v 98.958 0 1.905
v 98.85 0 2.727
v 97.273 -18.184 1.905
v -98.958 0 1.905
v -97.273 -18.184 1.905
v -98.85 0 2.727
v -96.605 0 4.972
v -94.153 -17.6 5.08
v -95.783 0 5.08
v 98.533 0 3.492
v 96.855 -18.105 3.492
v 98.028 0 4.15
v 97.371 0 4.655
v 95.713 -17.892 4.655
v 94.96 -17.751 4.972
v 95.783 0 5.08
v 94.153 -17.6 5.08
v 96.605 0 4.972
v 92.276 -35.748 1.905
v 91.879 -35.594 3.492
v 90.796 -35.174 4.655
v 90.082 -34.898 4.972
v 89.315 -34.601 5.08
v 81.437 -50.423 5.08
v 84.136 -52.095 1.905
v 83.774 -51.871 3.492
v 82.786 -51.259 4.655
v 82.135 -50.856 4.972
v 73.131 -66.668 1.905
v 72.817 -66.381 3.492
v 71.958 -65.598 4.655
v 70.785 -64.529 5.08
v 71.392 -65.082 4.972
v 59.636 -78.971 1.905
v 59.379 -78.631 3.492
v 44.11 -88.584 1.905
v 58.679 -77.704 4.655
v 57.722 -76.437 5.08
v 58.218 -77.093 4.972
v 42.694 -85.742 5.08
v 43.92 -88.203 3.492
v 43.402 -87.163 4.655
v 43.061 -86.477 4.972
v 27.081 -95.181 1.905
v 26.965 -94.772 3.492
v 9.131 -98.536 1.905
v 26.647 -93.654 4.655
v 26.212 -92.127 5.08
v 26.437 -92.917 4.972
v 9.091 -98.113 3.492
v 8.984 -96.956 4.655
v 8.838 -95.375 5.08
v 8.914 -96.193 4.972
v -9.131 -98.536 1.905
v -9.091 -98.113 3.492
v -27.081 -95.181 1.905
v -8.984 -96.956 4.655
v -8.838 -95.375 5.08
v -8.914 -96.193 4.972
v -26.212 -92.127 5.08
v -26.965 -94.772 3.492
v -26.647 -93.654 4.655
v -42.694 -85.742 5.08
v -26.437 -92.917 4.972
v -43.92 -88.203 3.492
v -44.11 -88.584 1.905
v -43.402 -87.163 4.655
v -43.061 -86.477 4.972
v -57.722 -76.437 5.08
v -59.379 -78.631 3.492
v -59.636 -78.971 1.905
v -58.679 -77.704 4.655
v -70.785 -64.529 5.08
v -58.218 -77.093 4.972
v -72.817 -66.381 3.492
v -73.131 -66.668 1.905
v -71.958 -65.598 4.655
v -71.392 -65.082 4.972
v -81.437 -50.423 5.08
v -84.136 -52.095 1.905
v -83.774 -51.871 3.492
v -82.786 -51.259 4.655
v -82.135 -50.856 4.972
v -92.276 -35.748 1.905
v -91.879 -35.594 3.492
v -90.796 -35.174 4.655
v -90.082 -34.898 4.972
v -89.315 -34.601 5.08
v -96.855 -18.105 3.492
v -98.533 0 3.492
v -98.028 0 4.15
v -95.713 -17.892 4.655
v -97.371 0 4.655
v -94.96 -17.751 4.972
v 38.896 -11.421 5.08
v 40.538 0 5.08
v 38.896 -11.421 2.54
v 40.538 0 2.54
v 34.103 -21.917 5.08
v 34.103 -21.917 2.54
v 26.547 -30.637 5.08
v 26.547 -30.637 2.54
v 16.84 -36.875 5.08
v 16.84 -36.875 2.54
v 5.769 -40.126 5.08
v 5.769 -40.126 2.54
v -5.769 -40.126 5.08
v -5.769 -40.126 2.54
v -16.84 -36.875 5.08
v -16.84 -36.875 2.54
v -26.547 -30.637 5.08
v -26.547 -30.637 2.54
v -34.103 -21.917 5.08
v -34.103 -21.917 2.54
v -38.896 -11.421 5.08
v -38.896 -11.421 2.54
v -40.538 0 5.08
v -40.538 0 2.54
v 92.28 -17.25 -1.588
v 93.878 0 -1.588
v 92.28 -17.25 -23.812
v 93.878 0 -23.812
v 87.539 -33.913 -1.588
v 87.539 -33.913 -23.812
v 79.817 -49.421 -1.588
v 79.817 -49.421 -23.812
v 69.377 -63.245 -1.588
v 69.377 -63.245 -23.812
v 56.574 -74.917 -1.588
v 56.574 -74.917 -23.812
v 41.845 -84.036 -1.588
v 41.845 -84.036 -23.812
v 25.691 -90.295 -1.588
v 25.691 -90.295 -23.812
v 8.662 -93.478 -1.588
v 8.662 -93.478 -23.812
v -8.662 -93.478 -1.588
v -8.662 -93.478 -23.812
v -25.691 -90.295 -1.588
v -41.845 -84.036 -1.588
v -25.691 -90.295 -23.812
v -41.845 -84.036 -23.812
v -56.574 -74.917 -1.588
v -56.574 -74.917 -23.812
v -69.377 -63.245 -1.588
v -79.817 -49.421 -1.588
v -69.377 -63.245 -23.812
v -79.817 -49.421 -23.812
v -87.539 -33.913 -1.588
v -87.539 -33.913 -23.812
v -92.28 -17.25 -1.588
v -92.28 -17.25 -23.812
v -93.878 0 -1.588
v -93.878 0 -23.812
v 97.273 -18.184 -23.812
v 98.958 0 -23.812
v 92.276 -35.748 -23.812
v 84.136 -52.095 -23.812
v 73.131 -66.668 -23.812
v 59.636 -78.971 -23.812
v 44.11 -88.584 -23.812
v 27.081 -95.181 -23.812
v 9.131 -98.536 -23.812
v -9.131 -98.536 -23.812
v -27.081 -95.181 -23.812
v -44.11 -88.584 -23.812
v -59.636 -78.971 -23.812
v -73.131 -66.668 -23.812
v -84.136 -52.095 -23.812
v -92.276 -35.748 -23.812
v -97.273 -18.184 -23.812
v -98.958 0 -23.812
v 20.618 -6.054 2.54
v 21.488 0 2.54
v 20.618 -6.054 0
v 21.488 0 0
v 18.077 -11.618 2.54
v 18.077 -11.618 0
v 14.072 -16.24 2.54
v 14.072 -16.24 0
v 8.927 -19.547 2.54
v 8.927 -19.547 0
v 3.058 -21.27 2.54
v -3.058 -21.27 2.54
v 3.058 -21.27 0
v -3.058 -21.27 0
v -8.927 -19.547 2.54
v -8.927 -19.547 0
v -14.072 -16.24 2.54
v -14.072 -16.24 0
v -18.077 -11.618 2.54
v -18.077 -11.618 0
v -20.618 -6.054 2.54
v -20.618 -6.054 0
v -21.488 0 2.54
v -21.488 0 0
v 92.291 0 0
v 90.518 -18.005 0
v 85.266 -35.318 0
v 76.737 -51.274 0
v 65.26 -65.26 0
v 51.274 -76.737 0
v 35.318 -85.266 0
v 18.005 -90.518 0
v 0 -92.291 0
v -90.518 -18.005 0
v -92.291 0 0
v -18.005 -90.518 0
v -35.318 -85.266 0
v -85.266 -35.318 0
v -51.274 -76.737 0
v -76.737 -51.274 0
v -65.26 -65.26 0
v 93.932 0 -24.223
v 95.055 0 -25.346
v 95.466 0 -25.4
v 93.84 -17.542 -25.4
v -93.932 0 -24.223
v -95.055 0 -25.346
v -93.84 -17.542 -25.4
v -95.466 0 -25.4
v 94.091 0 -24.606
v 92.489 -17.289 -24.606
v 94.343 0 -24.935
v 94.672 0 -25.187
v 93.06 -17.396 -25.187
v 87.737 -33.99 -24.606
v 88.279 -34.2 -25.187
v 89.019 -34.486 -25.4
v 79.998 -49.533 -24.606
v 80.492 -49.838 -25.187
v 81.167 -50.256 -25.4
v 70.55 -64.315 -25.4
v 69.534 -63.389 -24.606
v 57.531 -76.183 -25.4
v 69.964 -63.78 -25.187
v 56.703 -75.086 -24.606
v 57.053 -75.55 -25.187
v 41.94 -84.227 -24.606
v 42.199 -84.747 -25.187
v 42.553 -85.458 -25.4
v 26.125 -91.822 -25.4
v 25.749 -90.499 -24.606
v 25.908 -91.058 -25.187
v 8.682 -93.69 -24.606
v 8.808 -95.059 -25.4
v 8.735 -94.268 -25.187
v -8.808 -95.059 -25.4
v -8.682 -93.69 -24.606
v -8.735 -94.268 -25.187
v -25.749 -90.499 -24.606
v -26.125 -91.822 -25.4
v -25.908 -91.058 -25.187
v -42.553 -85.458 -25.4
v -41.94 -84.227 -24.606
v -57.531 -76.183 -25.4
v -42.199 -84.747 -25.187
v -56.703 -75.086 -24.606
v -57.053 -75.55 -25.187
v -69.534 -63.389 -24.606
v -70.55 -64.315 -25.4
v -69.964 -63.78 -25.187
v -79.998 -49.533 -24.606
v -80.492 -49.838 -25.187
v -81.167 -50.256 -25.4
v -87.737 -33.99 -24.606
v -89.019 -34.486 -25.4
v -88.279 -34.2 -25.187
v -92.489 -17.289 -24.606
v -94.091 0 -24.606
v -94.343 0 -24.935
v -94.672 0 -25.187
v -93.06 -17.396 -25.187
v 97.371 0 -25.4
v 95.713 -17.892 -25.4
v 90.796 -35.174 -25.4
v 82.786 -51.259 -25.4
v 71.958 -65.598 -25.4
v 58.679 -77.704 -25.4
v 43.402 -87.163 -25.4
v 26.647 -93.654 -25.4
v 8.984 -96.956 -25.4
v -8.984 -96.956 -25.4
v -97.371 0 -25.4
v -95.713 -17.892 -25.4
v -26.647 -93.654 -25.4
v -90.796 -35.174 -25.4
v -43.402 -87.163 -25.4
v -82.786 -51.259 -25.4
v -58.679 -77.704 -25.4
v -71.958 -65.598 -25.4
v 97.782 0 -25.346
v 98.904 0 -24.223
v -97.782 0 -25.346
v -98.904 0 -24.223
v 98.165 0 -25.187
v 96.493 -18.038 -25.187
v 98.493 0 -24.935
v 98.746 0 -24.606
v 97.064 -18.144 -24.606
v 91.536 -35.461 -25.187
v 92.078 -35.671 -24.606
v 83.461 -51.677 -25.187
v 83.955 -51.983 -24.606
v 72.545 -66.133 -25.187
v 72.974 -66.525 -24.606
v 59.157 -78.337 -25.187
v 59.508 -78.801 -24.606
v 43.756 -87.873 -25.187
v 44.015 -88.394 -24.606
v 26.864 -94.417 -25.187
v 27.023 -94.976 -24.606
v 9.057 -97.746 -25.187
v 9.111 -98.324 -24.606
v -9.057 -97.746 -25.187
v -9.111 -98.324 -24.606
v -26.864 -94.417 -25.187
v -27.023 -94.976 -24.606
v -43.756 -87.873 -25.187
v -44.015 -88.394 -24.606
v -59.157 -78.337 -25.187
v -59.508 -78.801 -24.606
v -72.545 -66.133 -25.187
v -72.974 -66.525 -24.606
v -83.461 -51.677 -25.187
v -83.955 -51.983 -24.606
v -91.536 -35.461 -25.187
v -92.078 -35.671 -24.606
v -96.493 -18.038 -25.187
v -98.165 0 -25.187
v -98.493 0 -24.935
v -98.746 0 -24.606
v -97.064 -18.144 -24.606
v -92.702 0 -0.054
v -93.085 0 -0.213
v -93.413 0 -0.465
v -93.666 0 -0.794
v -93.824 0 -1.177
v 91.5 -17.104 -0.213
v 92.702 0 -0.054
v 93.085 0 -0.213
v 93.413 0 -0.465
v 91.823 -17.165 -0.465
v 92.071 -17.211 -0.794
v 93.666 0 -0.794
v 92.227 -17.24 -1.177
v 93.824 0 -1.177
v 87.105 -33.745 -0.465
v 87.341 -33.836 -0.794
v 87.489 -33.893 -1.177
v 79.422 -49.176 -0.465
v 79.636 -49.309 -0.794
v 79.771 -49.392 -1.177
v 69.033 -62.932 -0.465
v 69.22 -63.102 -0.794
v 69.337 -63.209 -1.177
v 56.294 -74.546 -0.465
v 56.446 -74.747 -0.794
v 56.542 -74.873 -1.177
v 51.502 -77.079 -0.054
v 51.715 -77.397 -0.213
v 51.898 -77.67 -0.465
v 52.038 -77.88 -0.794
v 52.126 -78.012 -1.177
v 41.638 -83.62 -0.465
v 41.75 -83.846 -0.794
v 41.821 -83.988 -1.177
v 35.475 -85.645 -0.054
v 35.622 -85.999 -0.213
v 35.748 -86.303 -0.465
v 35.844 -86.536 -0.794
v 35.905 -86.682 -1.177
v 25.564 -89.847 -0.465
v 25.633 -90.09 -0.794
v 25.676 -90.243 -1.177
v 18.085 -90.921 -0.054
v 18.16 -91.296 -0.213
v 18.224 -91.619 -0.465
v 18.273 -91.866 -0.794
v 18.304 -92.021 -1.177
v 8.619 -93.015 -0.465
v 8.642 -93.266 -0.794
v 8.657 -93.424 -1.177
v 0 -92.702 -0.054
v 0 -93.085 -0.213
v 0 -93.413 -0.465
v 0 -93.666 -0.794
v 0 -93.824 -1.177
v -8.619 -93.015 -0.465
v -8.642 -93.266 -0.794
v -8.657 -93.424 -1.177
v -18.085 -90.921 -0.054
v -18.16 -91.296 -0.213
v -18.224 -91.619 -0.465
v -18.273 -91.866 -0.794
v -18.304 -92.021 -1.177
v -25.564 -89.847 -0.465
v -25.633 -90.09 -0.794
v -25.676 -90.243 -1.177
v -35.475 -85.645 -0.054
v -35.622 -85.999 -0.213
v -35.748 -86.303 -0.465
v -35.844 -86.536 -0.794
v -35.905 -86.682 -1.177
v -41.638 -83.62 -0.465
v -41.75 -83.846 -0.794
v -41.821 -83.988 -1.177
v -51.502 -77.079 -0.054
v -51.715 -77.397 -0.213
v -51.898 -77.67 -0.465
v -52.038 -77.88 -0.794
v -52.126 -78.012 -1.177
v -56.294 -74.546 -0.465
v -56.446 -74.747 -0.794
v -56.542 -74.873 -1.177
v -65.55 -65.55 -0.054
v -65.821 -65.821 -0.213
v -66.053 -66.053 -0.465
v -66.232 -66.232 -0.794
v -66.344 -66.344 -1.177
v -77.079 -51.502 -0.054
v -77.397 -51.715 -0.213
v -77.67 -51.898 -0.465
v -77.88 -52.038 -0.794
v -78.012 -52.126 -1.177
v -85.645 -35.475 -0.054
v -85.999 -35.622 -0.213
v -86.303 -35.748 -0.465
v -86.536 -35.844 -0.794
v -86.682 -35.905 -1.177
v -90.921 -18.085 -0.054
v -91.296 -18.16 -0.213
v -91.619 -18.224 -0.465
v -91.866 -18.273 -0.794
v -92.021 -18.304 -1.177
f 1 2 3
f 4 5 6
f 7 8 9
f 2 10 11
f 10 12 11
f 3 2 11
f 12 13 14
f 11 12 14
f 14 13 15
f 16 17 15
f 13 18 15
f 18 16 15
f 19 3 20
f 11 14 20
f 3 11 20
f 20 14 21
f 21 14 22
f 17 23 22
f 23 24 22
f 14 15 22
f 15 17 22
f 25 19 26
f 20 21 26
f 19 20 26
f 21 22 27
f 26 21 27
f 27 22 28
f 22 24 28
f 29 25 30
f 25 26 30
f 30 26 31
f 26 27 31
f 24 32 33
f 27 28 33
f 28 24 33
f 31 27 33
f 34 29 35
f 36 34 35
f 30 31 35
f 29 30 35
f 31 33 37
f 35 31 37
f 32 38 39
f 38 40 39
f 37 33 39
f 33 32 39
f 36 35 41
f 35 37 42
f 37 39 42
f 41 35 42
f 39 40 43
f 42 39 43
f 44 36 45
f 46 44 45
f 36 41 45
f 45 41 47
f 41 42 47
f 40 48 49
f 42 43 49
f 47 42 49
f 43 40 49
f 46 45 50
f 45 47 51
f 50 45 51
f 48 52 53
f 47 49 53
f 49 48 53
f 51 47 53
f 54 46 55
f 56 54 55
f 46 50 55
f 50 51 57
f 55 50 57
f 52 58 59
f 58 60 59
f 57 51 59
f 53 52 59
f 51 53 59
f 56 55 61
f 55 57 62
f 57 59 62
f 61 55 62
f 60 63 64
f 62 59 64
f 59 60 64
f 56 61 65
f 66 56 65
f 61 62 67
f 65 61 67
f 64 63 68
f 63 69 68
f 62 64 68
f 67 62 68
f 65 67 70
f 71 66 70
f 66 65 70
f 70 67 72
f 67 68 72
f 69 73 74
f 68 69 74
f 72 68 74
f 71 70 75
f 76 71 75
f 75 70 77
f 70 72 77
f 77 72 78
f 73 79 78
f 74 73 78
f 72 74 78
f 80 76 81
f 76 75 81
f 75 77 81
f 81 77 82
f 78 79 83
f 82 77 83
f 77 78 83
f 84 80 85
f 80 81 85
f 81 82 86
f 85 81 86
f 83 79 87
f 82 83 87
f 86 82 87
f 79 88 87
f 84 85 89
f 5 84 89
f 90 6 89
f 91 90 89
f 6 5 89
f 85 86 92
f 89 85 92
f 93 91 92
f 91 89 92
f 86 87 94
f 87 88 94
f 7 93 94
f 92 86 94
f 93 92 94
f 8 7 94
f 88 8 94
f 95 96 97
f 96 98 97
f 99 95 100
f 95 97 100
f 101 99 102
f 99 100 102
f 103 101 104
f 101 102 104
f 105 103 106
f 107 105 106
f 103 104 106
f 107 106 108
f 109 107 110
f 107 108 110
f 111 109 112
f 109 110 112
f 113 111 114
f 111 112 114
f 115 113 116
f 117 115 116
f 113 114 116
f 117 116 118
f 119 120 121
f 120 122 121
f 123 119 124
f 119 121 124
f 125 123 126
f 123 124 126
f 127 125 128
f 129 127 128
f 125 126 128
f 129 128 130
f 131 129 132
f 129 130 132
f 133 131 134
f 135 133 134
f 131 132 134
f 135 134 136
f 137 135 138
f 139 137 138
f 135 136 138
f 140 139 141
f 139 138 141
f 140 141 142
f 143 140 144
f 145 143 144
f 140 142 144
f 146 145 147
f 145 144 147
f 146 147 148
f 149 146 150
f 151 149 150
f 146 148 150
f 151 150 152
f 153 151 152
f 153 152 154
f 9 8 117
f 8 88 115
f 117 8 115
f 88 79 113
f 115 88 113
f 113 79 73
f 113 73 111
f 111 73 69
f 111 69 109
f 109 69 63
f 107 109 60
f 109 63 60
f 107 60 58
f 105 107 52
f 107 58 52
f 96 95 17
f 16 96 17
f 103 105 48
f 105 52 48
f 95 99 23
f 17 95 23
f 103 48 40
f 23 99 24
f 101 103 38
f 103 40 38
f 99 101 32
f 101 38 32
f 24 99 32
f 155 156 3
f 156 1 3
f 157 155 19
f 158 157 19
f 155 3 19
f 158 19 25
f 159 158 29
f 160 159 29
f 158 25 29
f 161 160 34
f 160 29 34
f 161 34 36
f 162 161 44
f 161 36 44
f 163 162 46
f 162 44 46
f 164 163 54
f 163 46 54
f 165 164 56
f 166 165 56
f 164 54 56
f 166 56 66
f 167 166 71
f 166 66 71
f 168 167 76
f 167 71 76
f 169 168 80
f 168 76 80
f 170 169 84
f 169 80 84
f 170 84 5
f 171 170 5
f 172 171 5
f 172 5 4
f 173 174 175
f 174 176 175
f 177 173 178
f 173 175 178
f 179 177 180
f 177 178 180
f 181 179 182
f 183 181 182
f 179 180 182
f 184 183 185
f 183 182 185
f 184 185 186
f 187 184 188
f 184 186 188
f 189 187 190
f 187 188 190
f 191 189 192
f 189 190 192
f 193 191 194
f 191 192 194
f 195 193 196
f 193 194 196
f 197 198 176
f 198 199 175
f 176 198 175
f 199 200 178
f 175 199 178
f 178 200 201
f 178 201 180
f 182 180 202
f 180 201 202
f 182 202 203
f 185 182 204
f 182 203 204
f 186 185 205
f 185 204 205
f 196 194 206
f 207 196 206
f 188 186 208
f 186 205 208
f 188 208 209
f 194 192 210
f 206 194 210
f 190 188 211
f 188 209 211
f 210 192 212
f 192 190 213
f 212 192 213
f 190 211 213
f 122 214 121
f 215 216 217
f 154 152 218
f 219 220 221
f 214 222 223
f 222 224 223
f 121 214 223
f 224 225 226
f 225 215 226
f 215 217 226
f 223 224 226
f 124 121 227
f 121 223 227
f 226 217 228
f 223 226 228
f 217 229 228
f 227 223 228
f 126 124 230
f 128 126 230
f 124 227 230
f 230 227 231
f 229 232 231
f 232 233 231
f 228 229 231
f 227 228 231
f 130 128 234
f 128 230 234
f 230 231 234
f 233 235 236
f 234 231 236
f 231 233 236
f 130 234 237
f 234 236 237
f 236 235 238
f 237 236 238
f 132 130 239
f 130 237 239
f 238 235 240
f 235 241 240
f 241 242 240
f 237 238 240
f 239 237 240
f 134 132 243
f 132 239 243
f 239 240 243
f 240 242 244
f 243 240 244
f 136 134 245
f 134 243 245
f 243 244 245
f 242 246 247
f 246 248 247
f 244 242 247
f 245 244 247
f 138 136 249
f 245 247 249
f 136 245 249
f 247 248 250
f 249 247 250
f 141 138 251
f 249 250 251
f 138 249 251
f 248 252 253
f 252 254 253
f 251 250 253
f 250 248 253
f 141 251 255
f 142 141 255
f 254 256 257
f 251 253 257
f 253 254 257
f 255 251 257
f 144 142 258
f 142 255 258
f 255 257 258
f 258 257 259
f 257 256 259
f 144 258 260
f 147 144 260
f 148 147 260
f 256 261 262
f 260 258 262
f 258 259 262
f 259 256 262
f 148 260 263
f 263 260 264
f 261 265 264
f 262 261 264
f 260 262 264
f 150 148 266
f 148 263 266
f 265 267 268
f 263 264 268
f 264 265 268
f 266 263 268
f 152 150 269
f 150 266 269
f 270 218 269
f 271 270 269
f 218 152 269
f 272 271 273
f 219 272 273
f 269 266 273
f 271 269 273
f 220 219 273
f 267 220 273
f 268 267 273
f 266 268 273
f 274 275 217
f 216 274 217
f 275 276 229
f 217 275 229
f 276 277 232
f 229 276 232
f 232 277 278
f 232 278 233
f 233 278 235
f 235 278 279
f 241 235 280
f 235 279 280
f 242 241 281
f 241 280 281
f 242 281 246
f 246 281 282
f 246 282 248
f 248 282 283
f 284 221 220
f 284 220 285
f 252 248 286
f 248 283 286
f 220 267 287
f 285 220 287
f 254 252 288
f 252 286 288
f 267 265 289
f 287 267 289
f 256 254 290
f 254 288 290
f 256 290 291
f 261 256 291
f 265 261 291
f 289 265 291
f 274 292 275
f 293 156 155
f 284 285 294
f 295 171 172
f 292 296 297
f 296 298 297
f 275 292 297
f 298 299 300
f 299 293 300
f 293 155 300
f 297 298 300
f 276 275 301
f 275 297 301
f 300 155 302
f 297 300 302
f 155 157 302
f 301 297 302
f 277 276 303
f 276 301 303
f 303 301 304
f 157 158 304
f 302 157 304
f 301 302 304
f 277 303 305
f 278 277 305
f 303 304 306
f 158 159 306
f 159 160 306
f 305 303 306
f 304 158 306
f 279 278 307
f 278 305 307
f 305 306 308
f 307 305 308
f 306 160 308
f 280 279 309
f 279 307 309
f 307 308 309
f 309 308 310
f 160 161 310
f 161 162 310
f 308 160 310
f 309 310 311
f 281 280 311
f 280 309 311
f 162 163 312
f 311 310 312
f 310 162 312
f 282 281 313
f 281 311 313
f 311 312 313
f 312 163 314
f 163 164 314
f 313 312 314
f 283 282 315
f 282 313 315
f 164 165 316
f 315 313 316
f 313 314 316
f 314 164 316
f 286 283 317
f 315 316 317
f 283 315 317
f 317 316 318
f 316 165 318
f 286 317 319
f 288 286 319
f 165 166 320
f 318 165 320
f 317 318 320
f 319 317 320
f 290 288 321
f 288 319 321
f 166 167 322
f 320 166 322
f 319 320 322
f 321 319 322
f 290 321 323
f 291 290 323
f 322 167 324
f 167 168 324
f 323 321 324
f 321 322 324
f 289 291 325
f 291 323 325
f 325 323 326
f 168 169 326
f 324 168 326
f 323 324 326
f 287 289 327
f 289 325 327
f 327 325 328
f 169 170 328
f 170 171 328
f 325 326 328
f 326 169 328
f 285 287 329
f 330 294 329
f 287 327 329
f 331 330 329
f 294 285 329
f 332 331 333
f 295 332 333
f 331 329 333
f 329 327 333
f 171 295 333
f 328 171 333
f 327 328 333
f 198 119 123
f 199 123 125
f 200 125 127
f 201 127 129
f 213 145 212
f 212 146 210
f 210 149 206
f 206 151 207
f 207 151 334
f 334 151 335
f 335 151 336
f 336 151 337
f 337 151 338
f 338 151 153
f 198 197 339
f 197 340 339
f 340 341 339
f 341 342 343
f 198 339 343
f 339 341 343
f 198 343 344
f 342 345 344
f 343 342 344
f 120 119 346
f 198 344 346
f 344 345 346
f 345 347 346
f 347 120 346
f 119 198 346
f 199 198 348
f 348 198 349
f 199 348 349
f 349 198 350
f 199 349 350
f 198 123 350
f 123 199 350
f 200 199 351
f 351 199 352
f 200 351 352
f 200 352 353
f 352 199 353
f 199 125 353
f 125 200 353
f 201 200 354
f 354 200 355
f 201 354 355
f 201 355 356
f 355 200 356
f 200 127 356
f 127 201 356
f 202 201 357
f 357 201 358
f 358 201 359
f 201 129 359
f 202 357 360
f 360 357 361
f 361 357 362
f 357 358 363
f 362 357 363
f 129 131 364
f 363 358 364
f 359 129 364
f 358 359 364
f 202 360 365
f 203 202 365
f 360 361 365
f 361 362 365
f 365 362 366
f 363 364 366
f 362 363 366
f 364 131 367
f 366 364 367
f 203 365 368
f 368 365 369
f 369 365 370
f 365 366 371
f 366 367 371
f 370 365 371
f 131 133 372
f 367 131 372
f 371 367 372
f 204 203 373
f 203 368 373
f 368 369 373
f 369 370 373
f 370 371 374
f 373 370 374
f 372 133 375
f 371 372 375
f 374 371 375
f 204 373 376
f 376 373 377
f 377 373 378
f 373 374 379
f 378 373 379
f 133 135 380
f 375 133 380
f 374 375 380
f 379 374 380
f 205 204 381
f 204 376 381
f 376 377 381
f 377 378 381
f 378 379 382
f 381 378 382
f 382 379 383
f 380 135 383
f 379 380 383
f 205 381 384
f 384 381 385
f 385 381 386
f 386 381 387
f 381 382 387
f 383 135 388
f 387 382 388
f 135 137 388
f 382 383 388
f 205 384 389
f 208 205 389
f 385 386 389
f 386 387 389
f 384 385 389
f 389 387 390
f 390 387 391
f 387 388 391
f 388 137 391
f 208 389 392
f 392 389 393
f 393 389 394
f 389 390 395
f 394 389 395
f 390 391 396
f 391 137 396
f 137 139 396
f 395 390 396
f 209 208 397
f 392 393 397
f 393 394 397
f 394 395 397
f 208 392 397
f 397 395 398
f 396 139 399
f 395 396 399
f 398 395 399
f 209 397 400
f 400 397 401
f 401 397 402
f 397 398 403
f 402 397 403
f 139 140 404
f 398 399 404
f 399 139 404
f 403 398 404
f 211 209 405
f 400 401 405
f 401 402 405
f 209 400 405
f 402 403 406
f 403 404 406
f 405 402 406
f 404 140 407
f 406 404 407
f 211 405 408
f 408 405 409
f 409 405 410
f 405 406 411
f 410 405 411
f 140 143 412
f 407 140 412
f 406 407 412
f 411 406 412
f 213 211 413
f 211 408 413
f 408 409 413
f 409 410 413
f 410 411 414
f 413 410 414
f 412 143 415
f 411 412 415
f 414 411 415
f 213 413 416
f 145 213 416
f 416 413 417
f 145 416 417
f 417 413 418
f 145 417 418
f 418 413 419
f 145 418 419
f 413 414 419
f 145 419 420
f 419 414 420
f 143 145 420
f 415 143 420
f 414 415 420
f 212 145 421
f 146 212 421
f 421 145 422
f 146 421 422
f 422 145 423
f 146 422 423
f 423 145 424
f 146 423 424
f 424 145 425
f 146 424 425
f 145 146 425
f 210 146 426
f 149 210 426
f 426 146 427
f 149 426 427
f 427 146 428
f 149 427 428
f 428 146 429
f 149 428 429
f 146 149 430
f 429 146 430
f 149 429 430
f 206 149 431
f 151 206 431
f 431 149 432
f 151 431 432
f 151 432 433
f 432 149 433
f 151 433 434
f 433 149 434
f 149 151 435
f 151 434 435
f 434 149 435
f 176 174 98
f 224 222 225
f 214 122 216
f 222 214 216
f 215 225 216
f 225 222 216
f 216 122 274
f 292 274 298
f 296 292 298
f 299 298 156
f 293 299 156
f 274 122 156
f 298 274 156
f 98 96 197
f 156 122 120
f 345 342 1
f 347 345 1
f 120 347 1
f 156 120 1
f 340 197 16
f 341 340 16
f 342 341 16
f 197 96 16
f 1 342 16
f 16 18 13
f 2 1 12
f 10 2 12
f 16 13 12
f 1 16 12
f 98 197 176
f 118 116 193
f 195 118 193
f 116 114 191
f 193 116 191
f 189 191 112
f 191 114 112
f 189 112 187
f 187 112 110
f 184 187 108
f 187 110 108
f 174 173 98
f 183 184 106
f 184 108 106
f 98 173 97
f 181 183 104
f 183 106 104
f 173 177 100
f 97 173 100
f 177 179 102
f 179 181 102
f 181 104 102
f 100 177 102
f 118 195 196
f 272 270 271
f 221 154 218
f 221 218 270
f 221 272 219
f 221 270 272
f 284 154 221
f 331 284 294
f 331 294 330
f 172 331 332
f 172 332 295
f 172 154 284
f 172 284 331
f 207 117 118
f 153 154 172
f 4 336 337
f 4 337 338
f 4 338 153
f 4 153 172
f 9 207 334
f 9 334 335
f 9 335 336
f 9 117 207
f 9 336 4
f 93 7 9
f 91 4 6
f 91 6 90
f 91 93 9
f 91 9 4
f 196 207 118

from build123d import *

# Parameters (mm, degrees)
F1_ANGLE = 180


with BuildPart() as f1:
    # F0 (on Front) → F1 (revolve)
    with BuildSketch(Plane.XZ):
        with BuildLine():
            ThreePointArc((98.9584, 1.905), (98.028464, 4.150064), (95.7834, 5.08))
            Line((95.7834, 5.08), (40.5384, 5.08))
            Line((40.5384, 5.08), (40.5384, 2.54))
            Line((40.5384, 2.54), (21.4884, 2.54))
            Line((21.4884, 2.54), (21.4884, 0))
            Line((21.4884, 0), (92.2909, 0))
            ThreePointArc((92.2909, 0), (93.413432, -0.464968), (93.8784, -1.5875))
            Line((93.8784, -1.5875), (93.8784, -23.8125))
            ThreePointArc((93.8784, -23.8125), (94.343368, -24.935032), (95.4659, -25.4))
            Line((95.4659, -25.4), (97.3709, -25.4))
            ThreePointArc((97.3709, -25.4), (98.493432, -24.935032), (98.9584, -23.8125))
            Line((98.9584, -23.8125), (98.9584, 1.905))
        make_face()
    revolve(axis=Axis((0, 0, -0.332045), (0, 0, -1)), revolution_arc=F1_ANGLE)


solid = f1.part
